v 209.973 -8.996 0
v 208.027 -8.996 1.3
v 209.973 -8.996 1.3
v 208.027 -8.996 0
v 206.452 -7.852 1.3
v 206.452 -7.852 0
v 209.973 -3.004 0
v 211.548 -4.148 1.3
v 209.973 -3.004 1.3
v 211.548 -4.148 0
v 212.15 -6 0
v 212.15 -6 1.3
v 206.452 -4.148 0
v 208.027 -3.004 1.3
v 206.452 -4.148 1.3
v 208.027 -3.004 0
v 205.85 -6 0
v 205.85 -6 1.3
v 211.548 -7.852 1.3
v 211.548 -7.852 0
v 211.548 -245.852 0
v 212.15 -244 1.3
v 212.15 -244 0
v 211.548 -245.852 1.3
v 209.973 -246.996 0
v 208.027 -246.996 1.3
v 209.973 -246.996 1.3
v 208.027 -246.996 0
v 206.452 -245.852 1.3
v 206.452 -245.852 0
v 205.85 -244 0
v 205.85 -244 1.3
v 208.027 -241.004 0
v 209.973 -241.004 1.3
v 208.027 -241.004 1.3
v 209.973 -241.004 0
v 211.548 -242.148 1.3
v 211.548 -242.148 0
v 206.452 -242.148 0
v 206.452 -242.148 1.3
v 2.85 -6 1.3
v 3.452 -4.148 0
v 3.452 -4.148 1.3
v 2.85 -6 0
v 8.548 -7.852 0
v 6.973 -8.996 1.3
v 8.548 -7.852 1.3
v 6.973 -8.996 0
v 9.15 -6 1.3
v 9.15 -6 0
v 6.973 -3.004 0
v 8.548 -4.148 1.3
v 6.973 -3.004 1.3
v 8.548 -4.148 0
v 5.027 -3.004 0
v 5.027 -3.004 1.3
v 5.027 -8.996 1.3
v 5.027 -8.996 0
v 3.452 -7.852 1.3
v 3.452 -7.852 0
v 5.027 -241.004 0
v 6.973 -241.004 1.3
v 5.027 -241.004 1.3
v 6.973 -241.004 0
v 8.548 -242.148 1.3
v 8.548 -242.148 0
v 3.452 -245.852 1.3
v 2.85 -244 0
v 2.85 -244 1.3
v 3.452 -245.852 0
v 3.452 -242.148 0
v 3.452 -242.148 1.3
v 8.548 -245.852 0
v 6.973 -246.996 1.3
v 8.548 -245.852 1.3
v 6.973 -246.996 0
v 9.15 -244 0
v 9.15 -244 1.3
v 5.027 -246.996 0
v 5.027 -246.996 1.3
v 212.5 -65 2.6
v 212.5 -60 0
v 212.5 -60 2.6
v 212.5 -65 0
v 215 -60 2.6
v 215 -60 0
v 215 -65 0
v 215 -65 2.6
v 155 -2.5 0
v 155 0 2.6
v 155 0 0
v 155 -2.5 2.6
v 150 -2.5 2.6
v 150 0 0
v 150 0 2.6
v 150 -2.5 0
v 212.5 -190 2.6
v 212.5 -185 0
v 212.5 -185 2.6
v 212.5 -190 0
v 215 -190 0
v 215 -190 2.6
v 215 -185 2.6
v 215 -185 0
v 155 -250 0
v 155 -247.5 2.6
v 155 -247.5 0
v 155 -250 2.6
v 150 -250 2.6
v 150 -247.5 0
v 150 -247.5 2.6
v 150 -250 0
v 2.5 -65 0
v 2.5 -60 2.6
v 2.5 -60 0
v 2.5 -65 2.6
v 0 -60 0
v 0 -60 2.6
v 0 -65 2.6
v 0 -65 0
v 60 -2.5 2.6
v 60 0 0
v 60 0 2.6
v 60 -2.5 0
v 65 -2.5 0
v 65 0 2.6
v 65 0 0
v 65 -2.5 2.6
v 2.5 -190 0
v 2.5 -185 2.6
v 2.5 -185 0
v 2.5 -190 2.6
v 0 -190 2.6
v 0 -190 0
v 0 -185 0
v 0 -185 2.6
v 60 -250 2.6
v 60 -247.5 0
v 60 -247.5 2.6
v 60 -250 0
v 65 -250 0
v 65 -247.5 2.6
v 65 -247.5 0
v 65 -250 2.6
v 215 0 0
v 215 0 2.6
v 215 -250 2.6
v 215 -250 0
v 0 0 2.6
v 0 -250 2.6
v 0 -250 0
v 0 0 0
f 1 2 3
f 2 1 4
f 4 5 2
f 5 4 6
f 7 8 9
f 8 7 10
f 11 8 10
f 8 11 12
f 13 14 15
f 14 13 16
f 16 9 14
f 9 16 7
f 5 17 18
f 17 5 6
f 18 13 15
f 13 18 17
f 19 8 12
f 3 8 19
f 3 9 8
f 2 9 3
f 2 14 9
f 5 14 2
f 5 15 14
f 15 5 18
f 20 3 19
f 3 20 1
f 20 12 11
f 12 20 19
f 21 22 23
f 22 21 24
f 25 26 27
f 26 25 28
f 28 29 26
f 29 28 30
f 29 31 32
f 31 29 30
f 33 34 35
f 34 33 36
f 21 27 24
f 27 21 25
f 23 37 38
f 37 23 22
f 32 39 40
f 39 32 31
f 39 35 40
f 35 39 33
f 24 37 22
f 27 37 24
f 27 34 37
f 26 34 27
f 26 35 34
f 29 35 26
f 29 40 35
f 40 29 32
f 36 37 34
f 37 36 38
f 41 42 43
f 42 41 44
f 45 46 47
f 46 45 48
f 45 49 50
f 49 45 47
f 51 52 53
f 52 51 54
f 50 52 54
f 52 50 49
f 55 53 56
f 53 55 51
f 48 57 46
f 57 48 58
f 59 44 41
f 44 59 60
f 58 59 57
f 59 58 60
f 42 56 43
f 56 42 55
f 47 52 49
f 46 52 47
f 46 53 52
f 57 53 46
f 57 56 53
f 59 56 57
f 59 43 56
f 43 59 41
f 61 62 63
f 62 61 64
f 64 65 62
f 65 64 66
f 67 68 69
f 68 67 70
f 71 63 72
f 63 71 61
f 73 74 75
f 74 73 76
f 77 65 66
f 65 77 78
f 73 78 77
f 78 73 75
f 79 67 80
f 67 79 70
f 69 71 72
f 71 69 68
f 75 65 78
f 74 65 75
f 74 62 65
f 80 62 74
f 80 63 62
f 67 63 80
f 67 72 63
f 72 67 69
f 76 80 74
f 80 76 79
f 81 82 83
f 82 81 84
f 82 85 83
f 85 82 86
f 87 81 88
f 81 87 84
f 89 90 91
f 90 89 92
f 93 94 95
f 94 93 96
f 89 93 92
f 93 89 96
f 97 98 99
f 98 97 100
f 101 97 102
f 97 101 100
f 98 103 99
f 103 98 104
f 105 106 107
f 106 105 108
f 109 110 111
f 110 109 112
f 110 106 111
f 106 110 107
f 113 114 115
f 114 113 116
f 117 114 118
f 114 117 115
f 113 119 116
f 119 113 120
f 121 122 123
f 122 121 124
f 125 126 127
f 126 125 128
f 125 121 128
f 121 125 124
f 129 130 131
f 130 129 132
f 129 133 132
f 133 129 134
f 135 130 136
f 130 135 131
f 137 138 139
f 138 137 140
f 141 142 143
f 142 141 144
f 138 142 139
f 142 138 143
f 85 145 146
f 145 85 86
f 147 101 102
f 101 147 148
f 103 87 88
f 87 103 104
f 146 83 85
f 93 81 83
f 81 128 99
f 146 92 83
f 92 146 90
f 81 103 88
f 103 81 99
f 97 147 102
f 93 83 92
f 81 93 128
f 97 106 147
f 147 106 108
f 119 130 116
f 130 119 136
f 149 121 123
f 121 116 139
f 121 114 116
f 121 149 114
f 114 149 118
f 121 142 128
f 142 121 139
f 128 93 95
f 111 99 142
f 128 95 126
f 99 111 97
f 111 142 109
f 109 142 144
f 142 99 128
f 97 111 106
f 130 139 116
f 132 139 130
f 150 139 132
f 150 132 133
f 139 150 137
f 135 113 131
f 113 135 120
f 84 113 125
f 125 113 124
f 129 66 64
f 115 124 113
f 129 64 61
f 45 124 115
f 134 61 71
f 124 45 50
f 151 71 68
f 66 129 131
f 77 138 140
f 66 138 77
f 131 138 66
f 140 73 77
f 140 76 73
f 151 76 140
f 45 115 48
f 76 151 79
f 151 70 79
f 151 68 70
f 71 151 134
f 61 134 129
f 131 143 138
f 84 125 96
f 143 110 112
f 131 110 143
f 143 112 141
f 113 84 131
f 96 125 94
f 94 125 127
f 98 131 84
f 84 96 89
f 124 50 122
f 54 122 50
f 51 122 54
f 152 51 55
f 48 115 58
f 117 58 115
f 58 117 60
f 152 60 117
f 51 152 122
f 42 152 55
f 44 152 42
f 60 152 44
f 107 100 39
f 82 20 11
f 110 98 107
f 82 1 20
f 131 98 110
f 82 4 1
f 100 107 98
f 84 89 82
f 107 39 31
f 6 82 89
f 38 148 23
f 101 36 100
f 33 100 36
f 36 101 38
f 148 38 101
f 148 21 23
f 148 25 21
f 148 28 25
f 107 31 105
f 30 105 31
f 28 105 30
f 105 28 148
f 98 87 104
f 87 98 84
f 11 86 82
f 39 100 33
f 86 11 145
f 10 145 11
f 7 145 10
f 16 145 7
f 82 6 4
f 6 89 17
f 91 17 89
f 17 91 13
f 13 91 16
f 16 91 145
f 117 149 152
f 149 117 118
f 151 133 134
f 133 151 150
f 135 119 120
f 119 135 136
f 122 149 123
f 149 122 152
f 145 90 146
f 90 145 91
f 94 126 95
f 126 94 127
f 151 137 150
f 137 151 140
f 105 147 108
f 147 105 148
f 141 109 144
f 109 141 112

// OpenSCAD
g_make_lid = 1;
g_make_tray = 0;

// counter_size = 13.3;
counter_size = 16.5;

/////////////////////////////////////////

// letter sized
g_tray_width = 215;
g_tray_height = 250;


g_tray_depth = 2.6;
tray_floor_thickness = 0.6; // 3 layers

counter_margin_x = 0.5;
counter_margin_y = 2;

g_magnet_diameter = 6 + 0.3;
g_magnet_depth = 1 + 0.3;
g_magnet_distance_from_edge = 6;

g_fill_margin = 1;

tray_padding_min = 1;
//counter_padding_width = 2;
//counter_padding_height = 2 + counter_size/4;

counter_outer_width = counter_size + 2*counter_margin_x;
counter_outer_height = counter_size + 2*counter_margin_y;

num_counters_x = floor(( g_tray_width - 2 * tray_padding_min- 2*counter_margin_y ) / counter_outer_width );
tray_inner_width = num_counters_x * counter_outer_width + counter_margin_x*2;
tray_padding_width =  ( g_tray_width - tray_inner_width ) / 2;

num_counters_y = floor((g_tray_height - 2 * tray_padding_min - 2*counter_margin_y ) / counter_outer_height );
tray_inner_height = num_counters_y * counter_outer_height + counter_margin_y*2;
tray_padding_height =  ( g_tray_height - tray_inner_height ) / 2;

echo( num_counters_x=num_counters_x,num_counters_y=num_counters_y );

module PositionLid ()
{
    if (g_make_tray)
    translate( [g_tray_width+10, 0, 0])
    children();
    else
    children();
}


if ( g_make_tray )
MakeTray();

if ( g_make_lid)
PositionLid()
MakeLid();

module Recenter()
{
    translate([0 ,-g_tray_height, 0])
    children();
}

module CenterForPadding()
{
    translate([tray_padding_width, tray_padding_height, 0])
    children();
}

module MakeCounter()
{
    module MakeCorner()
    {
        post_length = 4;
        post_width = 1;
        
        post_h_length = post_length;
        
        post_v_length = post_length;

        translate([0, 0, g_tray_depth/2])
        {
        
            if ( g_fill_margin )
            {
                color("purple") translate([counter_margin_x - post_width/2, counter_size/2,0])
                cube([ post_width, counter_size , g_tray_depth], center = true);

                color("blue") translate([post_v_length/2 + counter_margin_x - post_width/2, counter_margin_y/2, 0])
                cube([ post_v_length + post_width, counter_margin_y,g_tray_depth], center = true);
            }
            else
            {
                color("purple") translate([counter_margin_x - post_width/2, post_h_length/2 + counter_margin_y - post_width/2,0])
                cube([ post_width, post_h_length + post_width , g_tray_depth], center = true);

                color("red") translate([post_v_length/2 + counter_margin_x - post_width/2, counter_margin_y - post_width/2, 0])
                cube([ post_v_length + post_width, post_width,g_tray_depth], center = true);
            }
            
        
        
        }   
    }
    
    MakeCorner();
    
    translate( [counter_size + counter_margin_x*2,0,0])
    mirror([1,0,0])
    MakeCorner();

    translate( [0,counter_size + counter_margin_y*2,0])
    mirror([0,1,0])
    MakeCorner();
    
    translate( [counter_size + counter_margin_x*2,counter_size + counter_margin_y*2,0])
    mirror([1,0,0])
    mirror([0,1,0])
    MakeCorner();
    
    
    

    *difference()
    {
        color("green")
        cube([counter_outer_width, counter_outer_height, g_tray_depth]);

        color("red")
        translate( [0, counter_border, 1])
        cube([counter_outer_width, counter_size - 3,10]);
        
        color("red")
        translate( [counter_border, 0, 1])
        cube([counter_size - 3,counter_outer_height, 10]);
        
    }
}

module MakeAllCounters()
{

    color("green") 
    intersection()
    {
        cube([g_tray_width, g_tray_height, g_tray_depth]);

        CenterForPadding()
        for( i=[-1:num_counters_x], j=[-1:num_counters_y])
        {
            translate([ counter_margin_x + i * counter_outer_width, counter_margin_y + j * counter_outer_height, 0])
            //cube();
            MakeCounter();
        
        }
    }
}

module MakePadding()
{
    difference()
    {
        cube([g_tray_width, g_tray_height, g_tray_depth]);
        
        translate([tray_padding_width, tray_padding_height,0])
        cube([tray_inner_width, tray_inner_height, g_tray_depth]);

    }
}

module MakeTray()
{
    Recenter()
    {        
        difference()
        {
            union()
            {
                MakePadding();

                MakeAllCounters();
                
                color("yellow") cube( [g_tray_width, g_tray_height, tray_floor_thickness]);
            }

            MakeMagnetSlots();

            MakeTrayNotches();
        }
    }

}

module MakeLid()
{
    Recenter()
    {        
        difference()
        {
 
            color("yellow") cube( [g_tray_width, g_tray_height, g_tray_depth]);
            
            MakeMagnetSlots();

            MakeTrayNotches();
        }
    }

}

module MakeInFourCorners()
{
    children();

    mirror([0,1,0])
    children();

    mirror([1,0,0])
    children(); 

    mirror([1,0,0])
    mirror([0,1,0])
    children();   
}

module MakeTrayNotches()
{
    diam = 5;
    height = 10;
    
    translate([g_tray_width/2, g_tray_height/2,0])
    {
        MakeInFourCorners()
        {
            translate( [g_tray_width/2, g_tray_height/2 - g_tray_height/4,0])
                cube( [diam,diam,height], center = true ); 
                
            translate( [g_tray_width/2 - g_tray_height/4, g_tray_height/2,0])
                cube( [diam,diam,height], center = true );
        }
    }
} 

module MakeMagnetSlots()
{

    translate([g_tray_width/2, g_tray_height/2,0])
    translate([0, 0, g_magnet_depth/2])
    {
        MakeInFourCorners()
        MakeSingleMagnetSlot();
    }
    

    module MakeSingleMagnetSlot()
    {
        extra_to_poke_through_bottom = 0.1;
        translate( [0,0,-extra_to_poke_through_bottom])
        translate( [g_tray_width/2 - g_magnet_distance_from_edge, g_tray_height/2 - g_magnet_distance_from_edge,0])
            cylinder( h = g_magnet_depth + 2*extra_to_poke_through_bottom, d = g_magnet_diameter, center = true );
    }
}
